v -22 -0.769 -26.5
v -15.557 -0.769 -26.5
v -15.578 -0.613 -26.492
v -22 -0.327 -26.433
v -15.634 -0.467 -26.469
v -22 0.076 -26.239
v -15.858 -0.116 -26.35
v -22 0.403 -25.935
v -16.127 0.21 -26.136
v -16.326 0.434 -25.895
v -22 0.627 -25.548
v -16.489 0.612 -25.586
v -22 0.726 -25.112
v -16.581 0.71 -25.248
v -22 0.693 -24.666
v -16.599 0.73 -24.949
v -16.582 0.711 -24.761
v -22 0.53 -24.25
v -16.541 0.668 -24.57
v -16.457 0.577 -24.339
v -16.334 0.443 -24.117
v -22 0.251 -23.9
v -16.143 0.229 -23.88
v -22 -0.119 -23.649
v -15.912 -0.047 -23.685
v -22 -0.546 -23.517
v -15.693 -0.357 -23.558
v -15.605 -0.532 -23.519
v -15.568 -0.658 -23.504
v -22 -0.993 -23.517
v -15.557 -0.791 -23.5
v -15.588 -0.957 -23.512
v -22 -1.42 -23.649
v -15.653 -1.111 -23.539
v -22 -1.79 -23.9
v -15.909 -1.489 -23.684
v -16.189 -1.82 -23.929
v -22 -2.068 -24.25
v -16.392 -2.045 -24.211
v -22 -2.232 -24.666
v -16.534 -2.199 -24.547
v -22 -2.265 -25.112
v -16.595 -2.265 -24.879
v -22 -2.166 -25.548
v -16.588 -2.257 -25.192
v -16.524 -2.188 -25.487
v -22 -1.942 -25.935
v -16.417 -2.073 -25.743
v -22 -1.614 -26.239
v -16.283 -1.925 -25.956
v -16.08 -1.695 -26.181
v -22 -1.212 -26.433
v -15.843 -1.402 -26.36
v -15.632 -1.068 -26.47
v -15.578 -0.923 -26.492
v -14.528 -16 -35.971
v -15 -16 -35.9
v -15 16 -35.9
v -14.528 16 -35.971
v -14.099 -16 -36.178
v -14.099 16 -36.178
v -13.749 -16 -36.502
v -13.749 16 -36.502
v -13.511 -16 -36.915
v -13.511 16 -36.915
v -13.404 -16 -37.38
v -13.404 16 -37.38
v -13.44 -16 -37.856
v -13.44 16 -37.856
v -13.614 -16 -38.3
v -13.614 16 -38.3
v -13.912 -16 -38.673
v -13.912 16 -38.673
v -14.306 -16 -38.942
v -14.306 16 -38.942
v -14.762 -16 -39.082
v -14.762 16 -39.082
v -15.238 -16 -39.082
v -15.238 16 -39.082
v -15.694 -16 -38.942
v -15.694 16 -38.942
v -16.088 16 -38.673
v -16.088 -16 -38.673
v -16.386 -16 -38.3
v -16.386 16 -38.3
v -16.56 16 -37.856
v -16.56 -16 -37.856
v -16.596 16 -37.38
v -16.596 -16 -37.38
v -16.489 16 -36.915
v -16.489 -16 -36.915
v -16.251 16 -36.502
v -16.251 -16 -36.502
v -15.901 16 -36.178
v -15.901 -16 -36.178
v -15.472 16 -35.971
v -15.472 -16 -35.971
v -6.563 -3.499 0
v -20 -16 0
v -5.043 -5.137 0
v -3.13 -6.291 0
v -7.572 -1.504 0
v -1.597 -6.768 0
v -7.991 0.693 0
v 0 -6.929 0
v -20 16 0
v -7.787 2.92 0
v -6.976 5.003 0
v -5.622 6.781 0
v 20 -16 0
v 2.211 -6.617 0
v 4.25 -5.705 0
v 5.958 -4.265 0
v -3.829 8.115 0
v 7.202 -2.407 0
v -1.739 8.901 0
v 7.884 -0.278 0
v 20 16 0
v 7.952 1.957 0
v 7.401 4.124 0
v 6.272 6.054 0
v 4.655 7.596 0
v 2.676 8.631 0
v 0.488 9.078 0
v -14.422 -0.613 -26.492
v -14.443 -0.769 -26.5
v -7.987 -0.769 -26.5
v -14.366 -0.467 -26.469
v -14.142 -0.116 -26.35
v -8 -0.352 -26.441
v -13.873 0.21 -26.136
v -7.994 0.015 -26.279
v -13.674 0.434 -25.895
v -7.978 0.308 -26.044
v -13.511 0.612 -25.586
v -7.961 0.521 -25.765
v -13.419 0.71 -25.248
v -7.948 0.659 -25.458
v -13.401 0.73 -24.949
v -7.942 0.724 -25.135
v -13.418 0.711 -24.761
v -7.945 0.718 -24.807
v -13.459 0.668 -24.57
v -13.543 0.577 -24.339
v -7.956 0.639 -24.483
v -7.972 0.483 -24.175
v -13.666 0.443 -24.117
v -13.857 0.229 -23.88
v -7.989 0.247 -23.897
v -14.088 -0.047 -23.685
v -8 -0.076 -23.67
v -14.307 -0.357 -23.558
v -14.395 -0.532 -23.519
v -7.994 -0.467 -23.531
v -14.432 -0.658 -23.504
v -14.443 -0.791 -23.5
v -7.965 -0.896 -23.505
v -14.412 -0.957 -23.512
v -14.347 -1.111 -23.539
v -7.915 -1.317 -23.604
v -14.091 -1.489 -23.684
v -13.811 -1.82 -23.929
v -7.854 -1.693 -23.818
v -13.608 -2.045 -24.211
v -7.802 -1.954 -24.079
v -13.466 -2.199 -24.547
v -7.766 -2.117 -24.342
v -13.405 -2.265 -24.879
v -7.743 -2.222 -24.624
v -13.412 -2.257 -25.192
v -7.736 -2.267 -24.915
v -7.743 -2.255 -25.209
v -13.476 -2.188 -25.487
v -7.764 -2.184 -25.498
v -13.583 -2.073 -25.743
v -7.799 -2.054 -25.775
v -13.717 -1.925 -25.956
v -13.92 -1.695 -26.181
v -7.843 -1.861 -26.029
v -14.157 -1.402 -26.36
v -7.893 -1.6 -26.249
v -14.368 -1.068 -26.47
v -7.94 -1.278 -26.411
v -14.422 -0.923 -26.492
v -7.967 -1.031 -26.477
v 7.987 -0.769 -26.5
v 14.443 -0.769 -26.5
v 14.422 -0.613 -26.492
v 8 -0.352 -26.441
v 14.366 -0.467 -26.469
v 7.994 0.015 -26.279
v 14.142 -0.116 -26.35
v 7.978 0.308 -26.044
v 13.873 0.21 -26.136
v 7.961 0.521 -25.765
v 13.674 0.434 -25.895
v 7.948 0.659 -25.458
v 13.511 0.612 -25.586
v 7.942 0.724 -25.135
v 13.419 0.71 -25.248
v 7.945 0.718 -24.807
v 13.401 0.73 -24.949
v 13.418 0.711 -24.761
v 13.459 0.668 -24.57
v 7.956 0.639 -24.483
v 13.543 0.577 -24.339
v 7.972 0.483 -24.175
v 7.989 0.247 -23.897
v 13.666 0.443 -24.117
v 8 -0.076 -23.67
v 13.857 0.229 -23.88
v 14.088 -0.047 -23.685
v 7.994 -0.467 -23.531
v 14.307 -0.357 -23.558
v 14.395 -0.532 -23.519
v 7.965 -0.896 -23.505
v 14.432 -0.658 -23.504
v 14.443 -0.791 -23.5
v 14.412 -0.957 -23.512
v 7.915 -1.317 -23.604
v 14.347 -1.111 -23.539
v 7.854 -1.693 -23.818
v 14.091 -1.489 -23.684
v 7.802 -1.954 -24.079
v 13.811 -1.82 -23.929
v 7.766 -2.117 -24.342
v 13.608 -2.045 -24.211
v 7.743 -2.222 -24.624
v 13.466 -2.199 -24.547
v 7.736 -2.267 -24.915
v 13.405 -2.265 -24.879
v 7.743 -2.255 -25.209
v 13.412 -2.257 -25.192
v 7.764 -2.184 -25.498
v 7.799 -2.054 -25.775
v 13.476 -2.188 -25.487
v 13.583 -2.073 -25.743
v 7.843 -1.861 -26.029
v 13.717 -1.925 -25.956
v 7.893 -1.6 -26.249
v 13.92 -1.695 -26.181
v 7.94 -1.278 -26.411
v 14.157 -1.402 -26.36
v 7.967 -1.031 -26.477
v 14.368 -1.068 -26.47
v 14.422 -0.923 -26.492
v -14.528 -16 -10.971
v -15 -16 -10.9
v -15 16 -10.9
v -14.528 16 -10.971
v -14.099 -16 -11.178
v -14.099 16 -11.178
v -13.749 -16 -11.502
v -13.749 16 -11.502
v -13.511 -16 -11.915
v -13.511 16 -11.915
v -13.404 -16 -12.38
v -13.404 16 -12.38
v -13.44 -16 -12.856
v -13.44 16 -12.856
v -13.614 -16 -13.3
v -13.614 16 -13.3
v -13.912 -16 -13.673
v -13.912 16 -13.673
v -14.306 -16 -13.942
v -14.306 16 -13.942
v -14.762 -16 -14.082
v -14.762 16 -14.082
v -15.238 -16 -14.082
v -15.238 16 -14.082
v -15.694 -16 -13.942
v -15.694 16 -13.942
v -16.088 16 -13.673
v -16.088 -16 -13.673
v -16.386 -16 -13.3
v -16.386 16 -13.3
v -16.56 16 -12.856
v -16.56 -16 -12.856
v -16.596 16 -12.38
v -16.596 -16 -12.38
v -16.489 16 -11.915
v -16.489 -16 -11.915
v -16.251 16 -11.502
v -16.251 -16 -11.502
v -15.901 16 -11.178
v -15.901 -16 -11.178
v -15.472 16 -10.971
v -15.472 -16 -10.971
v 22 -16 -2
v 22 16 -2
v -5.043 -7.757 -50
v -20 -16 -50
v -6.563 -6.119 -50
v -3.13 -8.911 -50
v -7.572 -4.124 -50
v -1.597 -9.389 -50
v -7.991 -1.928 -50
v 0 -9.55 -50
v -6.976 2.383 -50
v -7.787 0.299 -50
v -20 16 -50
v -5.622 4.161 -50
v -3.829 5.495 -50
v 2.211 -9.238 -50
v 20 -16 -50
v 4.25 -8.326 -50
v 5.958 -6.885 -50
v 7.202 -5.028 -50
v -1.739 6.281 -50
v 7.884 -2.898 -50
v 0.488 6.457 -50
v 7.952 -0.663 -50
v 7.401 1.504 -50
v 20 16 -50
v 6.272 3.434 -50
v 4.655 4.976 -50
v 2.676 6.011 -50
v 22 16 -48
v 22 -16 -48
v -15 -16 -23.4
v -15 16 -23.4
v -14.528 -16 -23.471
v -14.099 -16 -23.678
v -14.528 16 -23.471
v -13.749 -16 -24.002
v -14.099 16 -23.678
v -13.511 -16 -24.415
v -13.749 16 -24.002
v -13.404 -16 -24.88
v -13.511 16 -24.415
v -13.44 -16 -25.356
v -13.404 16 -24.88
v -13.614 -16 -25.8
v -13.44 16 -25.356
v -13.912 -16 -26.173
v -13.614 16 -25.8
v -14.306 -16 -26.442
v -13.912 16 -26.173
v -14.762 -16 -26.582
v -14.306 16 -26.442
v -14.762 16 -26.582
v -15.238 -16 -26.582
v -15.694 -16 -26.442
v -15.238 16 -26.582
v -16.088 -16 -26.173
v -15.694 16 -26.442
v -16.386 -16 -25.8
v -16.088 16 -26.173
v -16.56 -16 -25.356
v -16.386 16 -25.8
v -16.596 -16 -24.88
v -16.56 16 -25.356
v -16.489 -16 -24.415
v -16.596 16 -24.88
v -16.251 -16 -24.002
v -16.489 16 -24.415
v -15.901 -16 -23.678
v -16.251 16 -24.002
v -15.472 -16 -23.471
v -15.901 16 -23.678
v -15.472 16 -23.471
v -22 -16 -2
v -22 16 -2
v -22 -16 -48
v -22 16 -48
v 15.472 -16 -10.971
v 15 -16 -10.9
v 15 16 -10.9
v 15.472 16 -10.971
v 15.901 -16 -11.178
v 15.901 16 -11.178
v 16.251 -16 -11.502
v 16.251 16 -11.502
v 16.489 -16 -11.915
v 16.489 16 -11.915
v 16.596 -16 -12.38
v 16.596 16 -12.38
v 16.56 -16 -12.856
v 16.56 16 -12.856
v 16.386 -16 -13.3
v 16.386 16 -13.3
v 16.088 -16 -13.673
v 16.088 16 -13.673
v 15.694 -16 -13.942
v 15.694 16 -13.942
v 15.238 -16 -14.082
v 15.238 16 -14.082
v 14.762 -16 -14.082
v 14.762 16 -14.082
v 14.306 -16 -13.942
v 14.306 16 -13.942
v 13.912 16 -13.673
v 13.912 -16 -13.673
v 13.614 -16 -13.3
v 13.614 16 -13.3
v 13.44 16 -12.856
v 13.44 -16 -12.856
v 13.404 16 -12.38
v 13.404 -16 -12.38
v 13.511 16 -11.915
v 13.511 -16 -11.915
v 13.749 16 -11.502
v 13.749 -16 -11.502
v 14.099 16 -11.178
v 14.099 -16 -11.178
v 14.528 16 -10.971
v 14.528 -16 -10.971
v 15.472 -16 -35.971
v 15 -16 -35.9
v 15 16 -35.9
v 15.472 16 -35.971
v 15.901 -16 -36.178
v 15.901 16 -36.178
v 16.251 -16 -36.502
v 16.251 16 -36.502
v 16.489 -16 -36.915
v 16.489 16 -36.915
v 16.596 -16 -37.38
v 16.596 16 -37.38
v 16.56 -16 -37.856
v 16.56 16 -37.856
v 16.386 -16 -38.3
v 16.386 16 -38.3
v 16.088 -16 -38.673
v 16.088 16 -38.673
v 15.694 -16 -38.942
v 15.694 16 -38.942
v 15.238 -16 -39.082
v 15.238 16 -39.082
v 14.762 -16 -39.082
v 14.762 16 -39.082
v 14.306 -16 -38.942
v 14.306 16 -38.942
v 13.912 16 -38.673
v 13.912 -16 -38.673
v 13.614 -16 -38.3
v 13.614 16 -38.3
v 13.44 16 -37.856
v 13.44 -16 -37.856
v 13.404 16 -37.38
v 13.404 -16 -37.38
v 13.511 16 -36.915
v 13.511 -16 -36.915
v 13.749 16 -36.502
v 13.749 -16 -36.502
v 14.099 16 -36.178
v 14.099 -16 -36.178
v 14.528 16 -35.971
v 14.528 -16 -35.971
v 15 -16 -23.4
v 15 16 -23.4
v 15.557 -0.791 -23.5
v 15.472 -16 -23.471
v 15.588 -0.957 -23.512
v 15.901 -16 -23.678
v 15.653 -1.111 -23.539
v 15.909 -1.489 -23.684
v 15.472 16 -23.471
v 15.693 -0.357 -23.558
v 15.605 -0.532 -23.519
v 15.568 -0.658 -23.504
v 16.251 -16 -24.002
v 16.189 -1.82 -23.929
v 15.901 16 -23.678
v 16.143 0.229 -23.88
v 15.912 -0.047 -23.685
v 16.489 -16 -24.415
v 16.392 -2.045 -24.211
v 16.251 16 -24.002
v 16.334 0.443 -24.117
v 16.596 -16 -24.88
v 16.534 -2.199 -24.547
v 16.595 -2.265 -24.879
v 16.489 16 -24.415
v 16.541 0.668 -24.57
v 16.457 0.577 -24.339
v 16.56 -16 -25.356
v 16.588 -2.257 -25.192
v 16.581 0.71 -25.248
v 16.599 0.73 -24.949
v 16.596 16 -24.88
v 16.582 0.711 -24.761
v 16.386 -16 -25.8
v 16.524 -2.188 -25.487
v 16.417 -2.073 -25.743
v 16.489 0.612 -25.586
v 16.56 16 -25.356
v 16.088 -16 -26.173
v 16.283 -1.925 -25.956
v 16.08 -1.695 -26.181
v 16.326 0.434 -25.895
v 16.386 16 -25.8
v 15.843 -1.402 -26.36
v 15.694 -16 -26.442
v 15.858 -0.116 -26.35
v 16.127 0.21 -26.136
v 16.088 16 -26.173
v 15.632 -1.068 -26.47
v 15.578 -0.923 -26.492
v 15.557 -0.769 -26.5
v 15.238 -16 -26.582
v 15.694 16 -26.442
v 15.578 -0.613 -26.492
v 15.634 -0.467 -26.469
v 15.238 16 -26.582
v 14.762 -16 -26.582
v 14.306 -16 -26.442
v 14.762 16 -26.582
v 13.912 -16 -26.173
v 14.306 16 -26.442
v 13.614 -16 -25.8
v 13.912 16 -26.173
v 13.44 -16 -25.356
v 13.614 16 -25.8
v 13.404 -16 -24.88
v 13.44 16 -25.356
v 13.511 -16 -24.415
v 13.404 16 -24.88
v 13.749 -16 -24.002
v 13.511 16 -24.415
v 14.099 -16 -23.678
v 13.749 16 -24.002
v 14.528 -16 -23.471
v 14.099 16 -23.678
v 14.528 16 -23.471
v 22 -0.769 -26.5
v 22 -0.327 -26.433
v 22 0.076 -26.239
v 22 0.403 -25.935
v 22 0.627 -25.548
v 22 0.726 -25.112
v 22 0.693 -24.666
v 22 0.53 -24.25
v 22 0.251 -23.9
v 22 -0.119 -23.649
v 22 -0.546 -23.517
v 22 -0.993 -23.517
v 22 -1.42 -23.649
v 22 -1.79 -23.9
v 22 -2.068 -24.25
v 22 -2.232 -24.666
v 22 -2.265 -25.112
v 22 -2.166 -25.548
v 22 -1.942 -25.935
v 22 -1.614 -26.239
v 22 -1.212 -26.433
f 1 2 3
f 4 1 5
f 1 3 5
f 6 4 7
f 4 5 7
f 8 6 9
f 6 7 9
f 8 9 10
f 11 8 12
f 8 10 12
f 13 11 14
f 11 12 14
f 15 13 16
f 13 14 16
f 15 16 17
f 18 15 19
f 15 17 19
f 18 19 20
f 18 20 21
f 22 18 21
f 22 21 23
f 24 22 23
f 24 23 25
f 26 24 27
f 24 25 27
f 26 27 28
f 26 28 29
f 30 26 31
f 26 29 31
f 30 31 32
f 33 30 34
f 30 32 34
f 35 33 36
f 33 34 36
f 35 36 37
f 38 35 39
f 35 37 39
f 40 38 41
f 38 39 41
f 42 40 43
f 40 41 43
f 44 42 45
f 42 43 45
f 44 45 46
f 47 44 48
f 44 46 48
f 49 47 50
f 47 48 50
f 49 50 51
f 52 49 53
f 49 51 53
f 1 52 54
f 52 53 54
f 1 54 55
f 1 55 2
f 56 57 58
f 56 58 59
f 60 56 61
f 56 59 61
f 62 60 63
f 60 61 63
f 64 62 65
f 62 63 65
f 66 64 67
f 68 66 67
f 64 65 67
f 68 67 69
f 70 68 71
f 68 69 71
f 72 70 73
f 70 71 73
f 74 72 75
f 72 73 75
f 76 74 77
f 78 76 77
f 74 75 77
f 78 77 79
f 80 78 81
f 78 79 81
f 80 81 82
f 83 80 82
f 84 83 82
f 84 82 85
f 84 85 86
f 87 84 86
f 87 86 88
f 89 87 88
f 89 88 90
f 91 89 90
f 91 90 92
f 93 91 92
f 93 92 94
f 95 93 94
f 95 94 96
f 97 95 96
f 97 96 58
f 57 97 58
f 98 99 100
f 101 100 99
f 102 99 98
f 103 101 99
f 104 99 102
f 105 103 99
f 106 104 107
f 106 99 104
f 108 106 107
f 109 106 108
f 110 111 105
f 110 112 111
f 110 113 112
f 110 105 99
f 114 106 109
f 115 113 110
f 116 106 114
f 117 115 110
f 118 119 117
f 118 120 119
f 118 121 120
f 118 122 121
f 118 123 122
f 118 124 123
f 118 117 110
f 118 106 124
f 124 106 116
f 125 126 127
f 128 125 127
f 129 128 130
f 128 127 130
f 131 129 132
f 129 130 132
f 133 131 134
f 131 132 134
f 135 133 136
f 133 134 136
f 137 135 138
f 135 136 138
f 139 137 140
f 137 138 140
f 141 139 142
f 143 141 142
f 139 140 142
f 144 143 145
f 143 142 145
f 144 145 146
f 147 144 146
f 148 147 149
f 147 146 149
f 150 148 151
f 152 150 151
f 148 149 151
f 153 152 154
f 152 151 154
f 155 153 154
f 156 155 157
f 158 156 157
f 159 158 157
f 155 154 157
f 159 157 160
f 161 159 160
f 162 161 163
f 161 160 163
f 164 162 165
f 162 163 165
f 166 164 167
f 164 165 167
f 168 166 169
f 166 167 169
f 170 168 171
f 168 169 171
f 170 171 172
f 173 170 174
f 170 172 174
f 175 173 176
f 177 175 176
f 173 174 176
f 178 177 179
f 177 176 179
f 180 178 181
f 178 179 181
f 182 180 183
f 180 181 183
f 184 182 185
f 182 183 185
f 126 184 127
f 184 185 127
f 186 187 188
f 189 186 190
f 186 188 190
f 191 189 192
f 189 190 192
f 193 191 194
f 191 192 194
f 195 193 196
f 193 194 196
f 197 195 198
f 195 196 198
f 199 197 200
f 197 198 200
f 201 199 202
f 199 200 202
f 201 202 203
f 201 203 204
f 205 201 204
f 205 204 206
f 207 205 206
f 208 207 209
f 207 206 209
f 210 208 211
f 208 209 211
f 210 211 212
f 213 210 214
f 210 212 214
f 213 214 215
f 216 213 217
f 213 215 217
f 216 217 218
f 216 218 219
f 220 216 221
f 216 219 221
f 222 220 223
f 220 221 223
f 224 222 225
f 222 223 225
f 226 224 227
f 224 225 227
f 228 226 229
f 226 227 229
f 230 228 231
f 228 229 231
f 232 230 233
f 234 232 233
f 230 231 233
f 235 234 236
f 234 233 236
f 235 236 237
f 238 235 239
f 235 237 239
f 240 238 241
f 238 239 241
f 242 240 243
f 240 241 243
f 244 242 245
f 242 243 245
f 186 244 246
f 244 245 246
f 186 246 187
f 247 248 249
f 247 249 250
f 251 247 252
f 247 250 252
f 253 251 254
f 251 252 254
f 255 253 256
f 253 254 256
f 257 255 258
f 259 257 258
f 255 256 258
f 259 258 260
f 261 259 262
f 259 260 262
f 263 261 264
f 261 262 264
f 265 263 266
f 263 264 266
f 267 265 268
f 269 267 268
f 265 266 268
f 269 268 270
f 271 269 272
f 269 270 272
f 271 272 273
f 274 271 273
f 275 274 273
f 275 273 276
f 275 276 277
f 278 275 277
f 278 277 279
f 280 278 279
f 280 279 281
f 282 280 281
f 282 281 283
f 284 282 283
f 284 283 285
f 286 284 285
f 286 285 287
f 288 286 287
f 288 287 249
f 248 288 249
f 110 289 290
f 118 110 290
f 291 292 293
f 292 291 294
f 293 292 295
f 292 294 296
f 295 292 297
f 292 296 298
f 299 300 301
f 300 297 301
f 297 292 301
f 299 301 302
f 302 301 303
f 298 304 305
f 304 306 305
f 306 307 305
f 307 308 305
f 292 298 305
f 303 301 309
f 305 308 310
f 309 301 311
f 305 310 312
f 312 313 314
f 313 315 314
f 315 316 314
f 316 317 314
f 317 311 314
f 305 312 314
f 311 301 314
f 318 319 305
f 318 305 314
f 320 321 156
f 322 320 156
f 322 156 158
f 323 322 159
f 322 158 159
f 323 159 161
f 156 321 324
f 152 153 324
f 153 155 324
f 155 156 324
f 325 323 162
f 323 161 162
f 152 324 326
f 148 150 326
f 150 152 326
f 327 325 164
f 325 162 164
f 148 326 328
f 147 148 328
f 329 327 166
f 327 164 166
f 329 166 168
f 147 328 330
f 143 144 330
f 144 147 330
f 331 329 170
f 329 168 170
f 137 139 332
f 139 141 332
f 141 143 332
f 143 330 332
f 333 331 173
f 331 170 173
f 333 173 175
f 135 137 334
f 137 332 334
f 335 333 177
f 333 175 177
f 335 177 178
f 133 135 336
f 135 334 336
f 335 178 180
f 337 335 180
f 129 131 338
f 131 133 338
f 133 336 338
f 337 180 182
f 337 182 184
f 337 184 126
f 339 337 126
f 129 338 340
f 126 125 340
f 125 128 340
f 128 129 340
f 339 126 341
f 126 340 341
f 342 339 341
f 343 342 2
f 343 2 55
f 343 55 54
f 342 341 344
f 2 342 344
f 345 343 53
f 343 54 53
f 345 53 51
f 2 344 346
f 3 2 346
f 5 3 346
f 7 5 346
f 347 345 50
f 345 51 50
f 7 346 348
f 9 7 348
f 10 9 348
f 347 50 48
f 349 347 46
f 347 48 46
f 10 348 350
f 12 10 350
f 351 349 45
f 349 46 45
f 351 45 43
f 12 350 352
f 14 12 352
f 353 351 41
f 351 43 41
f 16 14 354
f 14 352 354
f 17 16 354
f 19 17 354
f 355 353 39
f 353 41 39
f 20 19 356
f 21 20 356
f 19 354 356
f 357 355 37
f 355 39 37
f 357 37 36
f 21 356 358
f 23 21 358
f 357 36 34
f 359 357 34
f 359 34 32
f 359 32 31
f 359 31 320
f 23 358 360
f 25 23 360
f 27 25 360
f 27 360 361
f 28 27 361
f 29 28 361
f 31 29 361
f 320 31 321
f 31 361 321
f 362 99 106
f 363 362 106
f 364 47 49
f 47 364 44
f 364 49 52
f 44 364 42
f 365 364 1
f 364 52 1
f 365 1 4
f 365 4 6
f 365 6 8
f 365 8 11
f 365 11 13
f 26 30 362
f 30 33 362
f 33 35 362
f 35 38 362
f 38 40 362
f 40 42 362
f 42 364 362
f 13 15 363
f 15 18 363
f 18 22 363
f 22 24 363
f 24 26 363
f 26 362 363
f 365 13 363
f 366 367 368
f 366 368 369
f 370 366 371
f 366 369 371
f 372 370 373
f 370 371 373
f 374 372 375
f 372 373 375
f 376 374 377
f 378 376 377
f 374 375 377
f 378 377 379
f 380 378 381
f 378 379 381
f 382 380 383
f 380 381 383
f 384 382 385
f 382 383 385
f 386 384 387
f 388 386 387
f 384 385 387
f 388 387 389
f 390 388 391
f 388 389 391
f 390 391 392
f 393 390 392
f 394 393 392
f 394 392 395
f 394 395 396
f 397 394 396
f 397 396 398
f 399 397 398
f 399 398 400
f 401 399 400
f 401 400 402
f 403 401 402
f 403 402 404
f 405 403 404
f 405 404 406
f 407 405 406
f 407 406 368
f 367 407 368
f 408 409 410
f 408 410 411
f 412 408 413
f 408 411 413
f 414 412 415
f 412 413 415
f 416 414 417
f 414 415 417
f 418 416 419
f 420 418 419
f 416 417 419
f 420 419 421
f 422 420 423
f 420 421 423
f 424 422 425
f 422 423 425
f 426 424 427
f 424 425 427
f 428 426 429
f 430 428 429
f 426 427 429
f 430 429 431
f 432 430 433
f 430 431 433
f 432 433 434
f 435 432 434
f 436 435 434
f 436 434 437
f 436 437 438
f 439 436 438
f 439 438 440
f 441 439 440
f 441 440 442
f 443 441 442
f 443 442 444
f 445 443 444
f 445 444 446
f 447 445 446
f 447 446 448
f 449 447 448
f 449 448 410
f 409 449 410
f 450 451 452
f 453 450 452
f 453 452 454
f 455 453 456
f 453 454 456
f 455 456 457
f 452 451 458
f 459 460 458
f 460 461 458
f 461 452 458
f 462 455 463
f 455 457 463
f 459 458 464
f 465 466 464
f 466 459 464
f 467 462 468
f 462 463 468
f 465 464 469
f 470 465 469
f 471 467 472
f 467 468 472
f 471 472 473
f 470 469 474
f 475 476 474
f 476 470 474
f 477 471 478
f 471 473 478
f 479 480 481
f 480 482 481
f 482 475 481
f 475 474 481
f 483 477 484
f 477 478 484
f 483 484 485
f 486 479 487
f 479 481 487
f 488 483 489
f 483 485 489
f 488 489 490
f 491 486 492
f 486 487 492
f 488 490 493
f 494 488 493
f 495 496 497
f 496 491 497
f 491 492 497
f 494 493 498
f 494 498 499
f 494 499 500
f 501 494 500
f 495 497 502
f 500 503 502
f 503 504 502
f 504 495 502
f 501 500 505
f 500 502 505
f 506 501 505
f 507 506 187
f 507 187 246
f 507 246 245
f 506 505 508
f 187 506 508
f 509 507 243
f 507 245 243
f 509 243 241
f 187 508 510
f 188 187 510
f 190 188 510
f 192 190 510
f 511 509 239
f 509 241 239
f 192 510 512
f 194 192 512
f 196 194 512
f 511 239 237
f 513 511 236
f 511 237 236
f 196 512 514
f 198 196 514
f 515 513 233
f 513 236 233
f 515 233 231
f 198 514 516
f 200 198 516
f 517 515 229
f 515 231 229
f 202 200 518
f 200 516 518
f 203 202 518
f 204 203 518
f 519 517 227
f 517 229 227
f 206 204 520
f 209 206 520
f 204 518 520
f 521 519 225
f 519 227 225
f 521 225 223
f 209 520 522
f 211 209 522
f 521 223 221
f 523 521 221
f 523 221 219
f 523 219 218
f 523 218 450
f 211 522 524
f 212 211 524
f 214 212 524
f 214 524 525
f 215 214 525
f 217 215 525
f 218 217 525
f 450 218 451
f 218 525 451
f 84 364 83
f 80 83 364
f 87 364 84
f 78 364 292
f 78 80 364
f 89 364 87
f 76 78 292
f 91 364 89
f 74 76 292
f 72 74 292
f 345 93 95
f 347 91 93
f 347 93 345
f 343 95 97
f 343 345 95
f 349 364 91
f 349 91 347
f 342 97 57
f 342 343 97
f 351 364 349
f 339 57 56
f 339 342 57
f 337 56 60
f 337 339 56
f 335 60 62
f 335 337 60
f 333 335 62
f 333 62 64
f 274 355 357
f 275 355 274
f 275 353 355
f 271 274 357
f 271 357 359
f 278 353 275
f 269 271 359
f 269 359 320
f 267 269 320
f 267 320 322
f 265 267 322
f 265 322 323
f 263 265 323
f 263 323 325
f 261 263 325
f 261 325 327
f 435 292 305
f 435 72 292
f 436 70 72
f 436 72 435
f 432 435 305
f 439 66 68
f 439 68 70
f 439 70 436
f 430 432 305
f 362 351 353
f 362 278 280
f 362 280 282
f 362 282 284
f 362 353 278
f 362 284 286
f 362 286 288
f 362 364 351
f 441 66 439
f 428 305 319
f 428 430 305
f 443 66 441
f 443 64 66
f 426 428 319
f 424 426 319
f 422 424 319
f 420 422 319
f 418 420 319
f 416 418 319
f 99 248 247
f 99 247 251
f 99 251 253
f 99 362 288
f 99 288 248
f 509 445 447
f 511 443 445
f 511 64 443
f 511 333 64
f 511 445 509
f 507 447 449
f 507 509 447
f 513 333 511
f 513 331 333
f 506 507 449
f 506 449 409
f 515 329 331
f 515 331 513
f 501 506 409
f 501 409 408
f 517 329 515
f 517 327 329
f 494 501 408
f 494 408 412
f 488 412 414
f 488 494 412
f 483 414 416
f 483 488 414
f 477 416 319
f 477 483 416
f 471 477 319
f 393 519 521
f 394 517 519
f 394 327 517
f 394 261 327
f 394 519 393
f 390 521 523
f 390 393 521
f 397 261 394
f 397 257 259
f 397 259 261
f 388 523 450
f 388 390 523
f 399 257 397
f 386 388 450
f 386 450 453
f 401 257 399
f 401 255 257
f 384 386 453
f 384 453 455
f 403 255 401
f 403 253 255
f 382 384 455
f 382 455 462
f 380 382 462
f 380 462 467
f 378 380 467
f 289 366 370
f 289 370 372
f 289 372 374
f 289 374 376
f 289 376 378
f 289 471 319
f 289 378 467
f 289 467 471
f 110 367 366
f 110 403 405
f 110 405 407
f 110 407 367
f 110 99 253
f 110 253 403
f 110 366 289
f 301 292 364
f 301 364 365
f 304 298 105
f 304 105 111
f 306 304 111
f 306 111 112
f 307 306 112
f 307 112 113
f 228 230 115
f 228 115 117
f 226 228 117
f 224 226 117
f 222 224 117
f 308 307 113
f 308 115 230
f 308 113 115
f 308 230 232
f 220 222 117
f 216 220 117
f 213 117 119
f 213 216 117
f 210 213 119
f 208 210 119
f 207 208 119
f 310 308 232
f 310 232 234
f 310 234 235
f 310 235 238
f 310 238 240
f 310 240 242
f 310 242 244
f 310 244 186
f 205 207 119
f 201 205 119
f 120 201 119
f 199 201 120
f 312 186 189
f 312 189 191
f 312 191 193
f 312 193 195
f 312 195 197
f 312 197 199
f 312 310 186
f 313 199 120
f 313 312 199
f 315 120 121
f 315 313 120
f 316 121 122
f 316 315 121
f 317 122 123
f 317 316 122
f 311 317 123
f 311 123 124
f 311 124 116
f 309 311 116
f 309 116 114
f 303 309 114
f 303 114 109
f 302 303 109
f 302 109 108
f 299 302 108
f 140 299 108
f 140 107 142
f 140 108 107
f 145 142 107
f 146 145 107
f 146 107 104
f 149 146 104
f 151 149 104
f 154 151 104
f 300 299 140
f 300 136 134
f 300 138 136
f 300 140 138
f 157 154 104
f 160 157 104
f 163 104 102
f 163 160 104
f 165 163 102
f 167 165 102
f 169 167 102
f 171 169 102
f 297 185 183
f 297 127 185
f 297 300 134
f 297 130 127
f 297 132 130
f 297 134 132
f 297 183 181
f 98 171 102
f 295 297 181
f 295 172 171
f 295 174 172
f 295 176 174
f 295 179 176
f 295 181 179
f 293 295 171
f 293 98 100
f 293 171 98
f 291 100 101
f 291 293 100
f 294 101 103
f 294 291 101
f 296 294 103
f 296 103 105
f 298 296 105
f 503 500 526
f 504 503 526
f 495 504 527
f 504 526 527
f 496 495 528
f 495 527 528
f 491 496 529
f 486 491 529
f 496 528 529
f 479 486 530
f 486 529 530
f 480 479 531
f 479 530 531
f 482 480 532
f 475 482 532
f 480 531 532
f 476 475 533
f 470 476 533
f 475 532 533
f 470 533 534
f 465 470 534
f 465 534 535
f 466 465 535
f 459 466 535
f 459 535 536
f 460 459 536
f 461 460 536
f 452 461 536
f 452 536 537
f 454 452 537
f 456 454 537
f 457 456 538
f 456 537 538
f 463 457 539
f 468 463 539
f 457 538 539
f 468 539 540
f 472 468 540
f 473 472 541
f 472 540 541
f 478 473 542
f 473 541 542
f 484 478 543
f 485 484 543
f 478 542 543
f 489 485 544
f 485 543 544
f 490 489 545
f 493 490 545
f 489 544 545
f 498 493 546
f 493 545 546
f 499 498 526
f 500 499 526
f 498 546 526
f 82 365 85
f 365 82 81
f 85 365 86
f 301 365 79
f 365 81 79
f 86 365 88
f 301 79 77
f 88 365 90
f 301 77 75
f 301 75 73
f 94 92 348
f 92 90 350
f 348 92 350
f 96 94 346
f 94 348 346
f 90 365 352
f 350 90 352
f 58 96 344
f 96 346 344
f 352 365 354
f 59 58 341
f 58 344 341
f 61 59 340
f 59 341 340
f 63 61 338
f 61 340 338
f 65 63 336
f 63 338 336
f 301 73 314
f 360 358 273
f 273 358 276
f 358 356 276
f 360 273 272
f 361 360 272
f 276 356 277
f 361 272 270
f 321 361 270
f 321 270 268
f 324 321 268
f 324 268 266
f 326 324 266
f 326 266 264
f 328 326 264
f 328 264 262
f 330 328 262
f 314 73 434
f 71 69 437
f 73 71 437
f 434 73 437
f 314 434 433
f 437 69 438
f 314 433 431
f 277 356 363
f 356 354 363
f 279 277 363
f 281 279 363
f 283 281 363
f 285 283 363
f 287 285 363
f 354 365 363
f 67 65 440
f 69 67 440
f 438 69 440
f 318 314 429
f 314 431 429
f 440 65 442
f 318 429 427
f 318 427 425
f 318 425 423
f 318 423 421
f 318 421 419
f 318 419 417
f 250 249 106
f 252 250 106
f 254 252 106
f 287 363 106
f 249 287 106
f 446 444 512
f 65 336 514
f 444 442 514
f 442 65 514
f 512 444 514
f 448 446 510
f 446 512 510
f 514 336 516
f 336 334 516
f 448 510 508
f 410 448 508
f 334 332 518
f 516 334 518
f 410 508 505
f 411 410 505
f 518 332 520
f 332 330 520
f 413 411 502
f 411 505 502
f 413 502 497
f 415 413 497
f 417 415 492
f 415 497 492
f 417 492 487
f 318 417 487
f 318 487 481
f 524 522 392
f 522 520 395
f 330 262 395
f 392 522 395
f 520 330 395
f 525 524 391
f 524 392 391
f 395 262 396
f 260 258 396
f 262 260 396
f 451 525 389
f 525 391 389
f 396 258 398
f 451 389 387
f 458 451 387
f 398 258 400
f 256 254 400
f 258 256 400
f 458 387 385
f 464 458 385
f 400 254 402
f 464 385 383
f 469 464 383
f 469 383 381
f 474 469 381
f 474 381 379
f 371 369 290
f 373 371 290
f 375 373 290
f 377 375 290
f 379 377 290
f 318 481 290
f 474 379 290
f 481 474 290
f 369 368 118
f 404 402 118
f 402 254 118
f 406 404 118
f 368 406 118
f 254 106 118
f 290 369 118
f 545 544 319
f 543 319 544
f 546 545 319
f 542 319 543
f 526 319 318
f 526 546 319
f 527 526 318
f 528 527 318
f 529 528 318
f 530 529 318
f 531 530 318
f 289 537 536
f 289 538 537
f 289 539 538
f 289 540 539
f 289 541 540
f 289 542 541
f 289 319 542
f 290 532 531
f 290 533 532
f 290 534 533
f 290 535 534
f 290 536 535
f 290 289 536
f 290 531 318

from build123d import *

# Parameters (mm, degrees)
IZIM1_W                     = 44
IZIM1_H                     = 32
Y_KSEKLIK_EKSTR_ZYON1_DEPTH = 50
KES_EKSTR_ZYON1_DEPTH       = 56
KES_EKSTR_ZYON1_DEPTH_BACK  = 60
IZIM2_R                     = 8
IZIM4_R                     = 1.6
KES_EKSTR_ZYON2_DEPTH       = 60
IZIM5_R                     = 1.5
KES_EKSTR_ZYON3_DEPTH       = 45
PAH1_SIZE                   = 2


with BuildPart() as part:
    # Çizim1 → Yükseklik-Ekstrüzyon1 (new body)
    with BuildSketch(Plane.XY):
        Rectangle(IZIM1_W, IZIM1_H)
    extrude(amount=-Y_KSEKLIK_EKSTR_ZYON1_DEPTH)

    # Çizim2 → Kes-Ekstrüzyon1 (cut, two sides: drawn at the far end of the back side and taken through both)
    with BuildSketch(Plane(origin=(0, 0.043824837, 0.836227706), x_dir=(-1, 0, 0), z_dir=(0, 0.05233595624294396, 0.998629534754574)).offset(-KES_EKSTR_ZYON1_DEPTH_BACK)):
        with Locations(Location((0, -1.08, 0), (0, 0, 90))):
            Circle(IZIM2_R)
    extrude(amount=KES_EKSTR_ZYON1_DEPTH + KES_EKSTR_ZYON1_DEPTH_BACK, mode=Mode.SUBTRACT)

    # Çizim4 → Kes-Ekstrüzyon2 (cut)
    with BuildSketch(Plane(origin=(0, 16, 0), x_dir=(1, 0, 0), z_dir=(0, 1, 0))):
        with Locations(Location((-15, 25, 0), (0, 0, 270))):
            Circle(IZIM4_R)
        with Locations(Location((-15, 37.5, 0), (0, 0, 270))):
            Circle(IZIM4_R)
        with Locations(Location((-15, 12.5, 0), (0, 0, 270))):
            Circle(IZIM4_R)
        with Locations(Location((15, 12.5, 0), (0, 0, 270))):
            Circle(IZIM4_R)
        with Locations(Location((15, 37.5, 0), (0, 0, 270))):
            Circle(IZIM4_R)
        with Locations(Location((15, 25, 0), (0, 0, 270))):
            Circle(IZIM4_R)
    extrude(amount=-KES_EKSTR_ZYON2_DEPTH, mode=Mode.SUBTRACT)

    # Çizim5 → Kes-Ekstrüzyon3 (cut, symmetric)
    with BuildSketch(Plane(origin=(0, 0, 0), x_dir=(0, 0, -1), z_dir=(1, 0, 0))):
        with Locations((25, -0.769453415)):
            Circle(IZIM5_R)
    extrude(amount=KES_EKSTR_ZYON3_DEPTH, both=True, mode=Mode.SUBTRACT)

    # Pah1
    pah1_edges = [part.edges().sort_by_distance(p)[0] for p in [
        (-22, 0, -50),
        (22, 0, -50),
        (-22, 0, 0),
        (22, 0, 0),
    ]]
    chamfer(pah1_edges, length=PAH1_SIZE)


solid = part.part
